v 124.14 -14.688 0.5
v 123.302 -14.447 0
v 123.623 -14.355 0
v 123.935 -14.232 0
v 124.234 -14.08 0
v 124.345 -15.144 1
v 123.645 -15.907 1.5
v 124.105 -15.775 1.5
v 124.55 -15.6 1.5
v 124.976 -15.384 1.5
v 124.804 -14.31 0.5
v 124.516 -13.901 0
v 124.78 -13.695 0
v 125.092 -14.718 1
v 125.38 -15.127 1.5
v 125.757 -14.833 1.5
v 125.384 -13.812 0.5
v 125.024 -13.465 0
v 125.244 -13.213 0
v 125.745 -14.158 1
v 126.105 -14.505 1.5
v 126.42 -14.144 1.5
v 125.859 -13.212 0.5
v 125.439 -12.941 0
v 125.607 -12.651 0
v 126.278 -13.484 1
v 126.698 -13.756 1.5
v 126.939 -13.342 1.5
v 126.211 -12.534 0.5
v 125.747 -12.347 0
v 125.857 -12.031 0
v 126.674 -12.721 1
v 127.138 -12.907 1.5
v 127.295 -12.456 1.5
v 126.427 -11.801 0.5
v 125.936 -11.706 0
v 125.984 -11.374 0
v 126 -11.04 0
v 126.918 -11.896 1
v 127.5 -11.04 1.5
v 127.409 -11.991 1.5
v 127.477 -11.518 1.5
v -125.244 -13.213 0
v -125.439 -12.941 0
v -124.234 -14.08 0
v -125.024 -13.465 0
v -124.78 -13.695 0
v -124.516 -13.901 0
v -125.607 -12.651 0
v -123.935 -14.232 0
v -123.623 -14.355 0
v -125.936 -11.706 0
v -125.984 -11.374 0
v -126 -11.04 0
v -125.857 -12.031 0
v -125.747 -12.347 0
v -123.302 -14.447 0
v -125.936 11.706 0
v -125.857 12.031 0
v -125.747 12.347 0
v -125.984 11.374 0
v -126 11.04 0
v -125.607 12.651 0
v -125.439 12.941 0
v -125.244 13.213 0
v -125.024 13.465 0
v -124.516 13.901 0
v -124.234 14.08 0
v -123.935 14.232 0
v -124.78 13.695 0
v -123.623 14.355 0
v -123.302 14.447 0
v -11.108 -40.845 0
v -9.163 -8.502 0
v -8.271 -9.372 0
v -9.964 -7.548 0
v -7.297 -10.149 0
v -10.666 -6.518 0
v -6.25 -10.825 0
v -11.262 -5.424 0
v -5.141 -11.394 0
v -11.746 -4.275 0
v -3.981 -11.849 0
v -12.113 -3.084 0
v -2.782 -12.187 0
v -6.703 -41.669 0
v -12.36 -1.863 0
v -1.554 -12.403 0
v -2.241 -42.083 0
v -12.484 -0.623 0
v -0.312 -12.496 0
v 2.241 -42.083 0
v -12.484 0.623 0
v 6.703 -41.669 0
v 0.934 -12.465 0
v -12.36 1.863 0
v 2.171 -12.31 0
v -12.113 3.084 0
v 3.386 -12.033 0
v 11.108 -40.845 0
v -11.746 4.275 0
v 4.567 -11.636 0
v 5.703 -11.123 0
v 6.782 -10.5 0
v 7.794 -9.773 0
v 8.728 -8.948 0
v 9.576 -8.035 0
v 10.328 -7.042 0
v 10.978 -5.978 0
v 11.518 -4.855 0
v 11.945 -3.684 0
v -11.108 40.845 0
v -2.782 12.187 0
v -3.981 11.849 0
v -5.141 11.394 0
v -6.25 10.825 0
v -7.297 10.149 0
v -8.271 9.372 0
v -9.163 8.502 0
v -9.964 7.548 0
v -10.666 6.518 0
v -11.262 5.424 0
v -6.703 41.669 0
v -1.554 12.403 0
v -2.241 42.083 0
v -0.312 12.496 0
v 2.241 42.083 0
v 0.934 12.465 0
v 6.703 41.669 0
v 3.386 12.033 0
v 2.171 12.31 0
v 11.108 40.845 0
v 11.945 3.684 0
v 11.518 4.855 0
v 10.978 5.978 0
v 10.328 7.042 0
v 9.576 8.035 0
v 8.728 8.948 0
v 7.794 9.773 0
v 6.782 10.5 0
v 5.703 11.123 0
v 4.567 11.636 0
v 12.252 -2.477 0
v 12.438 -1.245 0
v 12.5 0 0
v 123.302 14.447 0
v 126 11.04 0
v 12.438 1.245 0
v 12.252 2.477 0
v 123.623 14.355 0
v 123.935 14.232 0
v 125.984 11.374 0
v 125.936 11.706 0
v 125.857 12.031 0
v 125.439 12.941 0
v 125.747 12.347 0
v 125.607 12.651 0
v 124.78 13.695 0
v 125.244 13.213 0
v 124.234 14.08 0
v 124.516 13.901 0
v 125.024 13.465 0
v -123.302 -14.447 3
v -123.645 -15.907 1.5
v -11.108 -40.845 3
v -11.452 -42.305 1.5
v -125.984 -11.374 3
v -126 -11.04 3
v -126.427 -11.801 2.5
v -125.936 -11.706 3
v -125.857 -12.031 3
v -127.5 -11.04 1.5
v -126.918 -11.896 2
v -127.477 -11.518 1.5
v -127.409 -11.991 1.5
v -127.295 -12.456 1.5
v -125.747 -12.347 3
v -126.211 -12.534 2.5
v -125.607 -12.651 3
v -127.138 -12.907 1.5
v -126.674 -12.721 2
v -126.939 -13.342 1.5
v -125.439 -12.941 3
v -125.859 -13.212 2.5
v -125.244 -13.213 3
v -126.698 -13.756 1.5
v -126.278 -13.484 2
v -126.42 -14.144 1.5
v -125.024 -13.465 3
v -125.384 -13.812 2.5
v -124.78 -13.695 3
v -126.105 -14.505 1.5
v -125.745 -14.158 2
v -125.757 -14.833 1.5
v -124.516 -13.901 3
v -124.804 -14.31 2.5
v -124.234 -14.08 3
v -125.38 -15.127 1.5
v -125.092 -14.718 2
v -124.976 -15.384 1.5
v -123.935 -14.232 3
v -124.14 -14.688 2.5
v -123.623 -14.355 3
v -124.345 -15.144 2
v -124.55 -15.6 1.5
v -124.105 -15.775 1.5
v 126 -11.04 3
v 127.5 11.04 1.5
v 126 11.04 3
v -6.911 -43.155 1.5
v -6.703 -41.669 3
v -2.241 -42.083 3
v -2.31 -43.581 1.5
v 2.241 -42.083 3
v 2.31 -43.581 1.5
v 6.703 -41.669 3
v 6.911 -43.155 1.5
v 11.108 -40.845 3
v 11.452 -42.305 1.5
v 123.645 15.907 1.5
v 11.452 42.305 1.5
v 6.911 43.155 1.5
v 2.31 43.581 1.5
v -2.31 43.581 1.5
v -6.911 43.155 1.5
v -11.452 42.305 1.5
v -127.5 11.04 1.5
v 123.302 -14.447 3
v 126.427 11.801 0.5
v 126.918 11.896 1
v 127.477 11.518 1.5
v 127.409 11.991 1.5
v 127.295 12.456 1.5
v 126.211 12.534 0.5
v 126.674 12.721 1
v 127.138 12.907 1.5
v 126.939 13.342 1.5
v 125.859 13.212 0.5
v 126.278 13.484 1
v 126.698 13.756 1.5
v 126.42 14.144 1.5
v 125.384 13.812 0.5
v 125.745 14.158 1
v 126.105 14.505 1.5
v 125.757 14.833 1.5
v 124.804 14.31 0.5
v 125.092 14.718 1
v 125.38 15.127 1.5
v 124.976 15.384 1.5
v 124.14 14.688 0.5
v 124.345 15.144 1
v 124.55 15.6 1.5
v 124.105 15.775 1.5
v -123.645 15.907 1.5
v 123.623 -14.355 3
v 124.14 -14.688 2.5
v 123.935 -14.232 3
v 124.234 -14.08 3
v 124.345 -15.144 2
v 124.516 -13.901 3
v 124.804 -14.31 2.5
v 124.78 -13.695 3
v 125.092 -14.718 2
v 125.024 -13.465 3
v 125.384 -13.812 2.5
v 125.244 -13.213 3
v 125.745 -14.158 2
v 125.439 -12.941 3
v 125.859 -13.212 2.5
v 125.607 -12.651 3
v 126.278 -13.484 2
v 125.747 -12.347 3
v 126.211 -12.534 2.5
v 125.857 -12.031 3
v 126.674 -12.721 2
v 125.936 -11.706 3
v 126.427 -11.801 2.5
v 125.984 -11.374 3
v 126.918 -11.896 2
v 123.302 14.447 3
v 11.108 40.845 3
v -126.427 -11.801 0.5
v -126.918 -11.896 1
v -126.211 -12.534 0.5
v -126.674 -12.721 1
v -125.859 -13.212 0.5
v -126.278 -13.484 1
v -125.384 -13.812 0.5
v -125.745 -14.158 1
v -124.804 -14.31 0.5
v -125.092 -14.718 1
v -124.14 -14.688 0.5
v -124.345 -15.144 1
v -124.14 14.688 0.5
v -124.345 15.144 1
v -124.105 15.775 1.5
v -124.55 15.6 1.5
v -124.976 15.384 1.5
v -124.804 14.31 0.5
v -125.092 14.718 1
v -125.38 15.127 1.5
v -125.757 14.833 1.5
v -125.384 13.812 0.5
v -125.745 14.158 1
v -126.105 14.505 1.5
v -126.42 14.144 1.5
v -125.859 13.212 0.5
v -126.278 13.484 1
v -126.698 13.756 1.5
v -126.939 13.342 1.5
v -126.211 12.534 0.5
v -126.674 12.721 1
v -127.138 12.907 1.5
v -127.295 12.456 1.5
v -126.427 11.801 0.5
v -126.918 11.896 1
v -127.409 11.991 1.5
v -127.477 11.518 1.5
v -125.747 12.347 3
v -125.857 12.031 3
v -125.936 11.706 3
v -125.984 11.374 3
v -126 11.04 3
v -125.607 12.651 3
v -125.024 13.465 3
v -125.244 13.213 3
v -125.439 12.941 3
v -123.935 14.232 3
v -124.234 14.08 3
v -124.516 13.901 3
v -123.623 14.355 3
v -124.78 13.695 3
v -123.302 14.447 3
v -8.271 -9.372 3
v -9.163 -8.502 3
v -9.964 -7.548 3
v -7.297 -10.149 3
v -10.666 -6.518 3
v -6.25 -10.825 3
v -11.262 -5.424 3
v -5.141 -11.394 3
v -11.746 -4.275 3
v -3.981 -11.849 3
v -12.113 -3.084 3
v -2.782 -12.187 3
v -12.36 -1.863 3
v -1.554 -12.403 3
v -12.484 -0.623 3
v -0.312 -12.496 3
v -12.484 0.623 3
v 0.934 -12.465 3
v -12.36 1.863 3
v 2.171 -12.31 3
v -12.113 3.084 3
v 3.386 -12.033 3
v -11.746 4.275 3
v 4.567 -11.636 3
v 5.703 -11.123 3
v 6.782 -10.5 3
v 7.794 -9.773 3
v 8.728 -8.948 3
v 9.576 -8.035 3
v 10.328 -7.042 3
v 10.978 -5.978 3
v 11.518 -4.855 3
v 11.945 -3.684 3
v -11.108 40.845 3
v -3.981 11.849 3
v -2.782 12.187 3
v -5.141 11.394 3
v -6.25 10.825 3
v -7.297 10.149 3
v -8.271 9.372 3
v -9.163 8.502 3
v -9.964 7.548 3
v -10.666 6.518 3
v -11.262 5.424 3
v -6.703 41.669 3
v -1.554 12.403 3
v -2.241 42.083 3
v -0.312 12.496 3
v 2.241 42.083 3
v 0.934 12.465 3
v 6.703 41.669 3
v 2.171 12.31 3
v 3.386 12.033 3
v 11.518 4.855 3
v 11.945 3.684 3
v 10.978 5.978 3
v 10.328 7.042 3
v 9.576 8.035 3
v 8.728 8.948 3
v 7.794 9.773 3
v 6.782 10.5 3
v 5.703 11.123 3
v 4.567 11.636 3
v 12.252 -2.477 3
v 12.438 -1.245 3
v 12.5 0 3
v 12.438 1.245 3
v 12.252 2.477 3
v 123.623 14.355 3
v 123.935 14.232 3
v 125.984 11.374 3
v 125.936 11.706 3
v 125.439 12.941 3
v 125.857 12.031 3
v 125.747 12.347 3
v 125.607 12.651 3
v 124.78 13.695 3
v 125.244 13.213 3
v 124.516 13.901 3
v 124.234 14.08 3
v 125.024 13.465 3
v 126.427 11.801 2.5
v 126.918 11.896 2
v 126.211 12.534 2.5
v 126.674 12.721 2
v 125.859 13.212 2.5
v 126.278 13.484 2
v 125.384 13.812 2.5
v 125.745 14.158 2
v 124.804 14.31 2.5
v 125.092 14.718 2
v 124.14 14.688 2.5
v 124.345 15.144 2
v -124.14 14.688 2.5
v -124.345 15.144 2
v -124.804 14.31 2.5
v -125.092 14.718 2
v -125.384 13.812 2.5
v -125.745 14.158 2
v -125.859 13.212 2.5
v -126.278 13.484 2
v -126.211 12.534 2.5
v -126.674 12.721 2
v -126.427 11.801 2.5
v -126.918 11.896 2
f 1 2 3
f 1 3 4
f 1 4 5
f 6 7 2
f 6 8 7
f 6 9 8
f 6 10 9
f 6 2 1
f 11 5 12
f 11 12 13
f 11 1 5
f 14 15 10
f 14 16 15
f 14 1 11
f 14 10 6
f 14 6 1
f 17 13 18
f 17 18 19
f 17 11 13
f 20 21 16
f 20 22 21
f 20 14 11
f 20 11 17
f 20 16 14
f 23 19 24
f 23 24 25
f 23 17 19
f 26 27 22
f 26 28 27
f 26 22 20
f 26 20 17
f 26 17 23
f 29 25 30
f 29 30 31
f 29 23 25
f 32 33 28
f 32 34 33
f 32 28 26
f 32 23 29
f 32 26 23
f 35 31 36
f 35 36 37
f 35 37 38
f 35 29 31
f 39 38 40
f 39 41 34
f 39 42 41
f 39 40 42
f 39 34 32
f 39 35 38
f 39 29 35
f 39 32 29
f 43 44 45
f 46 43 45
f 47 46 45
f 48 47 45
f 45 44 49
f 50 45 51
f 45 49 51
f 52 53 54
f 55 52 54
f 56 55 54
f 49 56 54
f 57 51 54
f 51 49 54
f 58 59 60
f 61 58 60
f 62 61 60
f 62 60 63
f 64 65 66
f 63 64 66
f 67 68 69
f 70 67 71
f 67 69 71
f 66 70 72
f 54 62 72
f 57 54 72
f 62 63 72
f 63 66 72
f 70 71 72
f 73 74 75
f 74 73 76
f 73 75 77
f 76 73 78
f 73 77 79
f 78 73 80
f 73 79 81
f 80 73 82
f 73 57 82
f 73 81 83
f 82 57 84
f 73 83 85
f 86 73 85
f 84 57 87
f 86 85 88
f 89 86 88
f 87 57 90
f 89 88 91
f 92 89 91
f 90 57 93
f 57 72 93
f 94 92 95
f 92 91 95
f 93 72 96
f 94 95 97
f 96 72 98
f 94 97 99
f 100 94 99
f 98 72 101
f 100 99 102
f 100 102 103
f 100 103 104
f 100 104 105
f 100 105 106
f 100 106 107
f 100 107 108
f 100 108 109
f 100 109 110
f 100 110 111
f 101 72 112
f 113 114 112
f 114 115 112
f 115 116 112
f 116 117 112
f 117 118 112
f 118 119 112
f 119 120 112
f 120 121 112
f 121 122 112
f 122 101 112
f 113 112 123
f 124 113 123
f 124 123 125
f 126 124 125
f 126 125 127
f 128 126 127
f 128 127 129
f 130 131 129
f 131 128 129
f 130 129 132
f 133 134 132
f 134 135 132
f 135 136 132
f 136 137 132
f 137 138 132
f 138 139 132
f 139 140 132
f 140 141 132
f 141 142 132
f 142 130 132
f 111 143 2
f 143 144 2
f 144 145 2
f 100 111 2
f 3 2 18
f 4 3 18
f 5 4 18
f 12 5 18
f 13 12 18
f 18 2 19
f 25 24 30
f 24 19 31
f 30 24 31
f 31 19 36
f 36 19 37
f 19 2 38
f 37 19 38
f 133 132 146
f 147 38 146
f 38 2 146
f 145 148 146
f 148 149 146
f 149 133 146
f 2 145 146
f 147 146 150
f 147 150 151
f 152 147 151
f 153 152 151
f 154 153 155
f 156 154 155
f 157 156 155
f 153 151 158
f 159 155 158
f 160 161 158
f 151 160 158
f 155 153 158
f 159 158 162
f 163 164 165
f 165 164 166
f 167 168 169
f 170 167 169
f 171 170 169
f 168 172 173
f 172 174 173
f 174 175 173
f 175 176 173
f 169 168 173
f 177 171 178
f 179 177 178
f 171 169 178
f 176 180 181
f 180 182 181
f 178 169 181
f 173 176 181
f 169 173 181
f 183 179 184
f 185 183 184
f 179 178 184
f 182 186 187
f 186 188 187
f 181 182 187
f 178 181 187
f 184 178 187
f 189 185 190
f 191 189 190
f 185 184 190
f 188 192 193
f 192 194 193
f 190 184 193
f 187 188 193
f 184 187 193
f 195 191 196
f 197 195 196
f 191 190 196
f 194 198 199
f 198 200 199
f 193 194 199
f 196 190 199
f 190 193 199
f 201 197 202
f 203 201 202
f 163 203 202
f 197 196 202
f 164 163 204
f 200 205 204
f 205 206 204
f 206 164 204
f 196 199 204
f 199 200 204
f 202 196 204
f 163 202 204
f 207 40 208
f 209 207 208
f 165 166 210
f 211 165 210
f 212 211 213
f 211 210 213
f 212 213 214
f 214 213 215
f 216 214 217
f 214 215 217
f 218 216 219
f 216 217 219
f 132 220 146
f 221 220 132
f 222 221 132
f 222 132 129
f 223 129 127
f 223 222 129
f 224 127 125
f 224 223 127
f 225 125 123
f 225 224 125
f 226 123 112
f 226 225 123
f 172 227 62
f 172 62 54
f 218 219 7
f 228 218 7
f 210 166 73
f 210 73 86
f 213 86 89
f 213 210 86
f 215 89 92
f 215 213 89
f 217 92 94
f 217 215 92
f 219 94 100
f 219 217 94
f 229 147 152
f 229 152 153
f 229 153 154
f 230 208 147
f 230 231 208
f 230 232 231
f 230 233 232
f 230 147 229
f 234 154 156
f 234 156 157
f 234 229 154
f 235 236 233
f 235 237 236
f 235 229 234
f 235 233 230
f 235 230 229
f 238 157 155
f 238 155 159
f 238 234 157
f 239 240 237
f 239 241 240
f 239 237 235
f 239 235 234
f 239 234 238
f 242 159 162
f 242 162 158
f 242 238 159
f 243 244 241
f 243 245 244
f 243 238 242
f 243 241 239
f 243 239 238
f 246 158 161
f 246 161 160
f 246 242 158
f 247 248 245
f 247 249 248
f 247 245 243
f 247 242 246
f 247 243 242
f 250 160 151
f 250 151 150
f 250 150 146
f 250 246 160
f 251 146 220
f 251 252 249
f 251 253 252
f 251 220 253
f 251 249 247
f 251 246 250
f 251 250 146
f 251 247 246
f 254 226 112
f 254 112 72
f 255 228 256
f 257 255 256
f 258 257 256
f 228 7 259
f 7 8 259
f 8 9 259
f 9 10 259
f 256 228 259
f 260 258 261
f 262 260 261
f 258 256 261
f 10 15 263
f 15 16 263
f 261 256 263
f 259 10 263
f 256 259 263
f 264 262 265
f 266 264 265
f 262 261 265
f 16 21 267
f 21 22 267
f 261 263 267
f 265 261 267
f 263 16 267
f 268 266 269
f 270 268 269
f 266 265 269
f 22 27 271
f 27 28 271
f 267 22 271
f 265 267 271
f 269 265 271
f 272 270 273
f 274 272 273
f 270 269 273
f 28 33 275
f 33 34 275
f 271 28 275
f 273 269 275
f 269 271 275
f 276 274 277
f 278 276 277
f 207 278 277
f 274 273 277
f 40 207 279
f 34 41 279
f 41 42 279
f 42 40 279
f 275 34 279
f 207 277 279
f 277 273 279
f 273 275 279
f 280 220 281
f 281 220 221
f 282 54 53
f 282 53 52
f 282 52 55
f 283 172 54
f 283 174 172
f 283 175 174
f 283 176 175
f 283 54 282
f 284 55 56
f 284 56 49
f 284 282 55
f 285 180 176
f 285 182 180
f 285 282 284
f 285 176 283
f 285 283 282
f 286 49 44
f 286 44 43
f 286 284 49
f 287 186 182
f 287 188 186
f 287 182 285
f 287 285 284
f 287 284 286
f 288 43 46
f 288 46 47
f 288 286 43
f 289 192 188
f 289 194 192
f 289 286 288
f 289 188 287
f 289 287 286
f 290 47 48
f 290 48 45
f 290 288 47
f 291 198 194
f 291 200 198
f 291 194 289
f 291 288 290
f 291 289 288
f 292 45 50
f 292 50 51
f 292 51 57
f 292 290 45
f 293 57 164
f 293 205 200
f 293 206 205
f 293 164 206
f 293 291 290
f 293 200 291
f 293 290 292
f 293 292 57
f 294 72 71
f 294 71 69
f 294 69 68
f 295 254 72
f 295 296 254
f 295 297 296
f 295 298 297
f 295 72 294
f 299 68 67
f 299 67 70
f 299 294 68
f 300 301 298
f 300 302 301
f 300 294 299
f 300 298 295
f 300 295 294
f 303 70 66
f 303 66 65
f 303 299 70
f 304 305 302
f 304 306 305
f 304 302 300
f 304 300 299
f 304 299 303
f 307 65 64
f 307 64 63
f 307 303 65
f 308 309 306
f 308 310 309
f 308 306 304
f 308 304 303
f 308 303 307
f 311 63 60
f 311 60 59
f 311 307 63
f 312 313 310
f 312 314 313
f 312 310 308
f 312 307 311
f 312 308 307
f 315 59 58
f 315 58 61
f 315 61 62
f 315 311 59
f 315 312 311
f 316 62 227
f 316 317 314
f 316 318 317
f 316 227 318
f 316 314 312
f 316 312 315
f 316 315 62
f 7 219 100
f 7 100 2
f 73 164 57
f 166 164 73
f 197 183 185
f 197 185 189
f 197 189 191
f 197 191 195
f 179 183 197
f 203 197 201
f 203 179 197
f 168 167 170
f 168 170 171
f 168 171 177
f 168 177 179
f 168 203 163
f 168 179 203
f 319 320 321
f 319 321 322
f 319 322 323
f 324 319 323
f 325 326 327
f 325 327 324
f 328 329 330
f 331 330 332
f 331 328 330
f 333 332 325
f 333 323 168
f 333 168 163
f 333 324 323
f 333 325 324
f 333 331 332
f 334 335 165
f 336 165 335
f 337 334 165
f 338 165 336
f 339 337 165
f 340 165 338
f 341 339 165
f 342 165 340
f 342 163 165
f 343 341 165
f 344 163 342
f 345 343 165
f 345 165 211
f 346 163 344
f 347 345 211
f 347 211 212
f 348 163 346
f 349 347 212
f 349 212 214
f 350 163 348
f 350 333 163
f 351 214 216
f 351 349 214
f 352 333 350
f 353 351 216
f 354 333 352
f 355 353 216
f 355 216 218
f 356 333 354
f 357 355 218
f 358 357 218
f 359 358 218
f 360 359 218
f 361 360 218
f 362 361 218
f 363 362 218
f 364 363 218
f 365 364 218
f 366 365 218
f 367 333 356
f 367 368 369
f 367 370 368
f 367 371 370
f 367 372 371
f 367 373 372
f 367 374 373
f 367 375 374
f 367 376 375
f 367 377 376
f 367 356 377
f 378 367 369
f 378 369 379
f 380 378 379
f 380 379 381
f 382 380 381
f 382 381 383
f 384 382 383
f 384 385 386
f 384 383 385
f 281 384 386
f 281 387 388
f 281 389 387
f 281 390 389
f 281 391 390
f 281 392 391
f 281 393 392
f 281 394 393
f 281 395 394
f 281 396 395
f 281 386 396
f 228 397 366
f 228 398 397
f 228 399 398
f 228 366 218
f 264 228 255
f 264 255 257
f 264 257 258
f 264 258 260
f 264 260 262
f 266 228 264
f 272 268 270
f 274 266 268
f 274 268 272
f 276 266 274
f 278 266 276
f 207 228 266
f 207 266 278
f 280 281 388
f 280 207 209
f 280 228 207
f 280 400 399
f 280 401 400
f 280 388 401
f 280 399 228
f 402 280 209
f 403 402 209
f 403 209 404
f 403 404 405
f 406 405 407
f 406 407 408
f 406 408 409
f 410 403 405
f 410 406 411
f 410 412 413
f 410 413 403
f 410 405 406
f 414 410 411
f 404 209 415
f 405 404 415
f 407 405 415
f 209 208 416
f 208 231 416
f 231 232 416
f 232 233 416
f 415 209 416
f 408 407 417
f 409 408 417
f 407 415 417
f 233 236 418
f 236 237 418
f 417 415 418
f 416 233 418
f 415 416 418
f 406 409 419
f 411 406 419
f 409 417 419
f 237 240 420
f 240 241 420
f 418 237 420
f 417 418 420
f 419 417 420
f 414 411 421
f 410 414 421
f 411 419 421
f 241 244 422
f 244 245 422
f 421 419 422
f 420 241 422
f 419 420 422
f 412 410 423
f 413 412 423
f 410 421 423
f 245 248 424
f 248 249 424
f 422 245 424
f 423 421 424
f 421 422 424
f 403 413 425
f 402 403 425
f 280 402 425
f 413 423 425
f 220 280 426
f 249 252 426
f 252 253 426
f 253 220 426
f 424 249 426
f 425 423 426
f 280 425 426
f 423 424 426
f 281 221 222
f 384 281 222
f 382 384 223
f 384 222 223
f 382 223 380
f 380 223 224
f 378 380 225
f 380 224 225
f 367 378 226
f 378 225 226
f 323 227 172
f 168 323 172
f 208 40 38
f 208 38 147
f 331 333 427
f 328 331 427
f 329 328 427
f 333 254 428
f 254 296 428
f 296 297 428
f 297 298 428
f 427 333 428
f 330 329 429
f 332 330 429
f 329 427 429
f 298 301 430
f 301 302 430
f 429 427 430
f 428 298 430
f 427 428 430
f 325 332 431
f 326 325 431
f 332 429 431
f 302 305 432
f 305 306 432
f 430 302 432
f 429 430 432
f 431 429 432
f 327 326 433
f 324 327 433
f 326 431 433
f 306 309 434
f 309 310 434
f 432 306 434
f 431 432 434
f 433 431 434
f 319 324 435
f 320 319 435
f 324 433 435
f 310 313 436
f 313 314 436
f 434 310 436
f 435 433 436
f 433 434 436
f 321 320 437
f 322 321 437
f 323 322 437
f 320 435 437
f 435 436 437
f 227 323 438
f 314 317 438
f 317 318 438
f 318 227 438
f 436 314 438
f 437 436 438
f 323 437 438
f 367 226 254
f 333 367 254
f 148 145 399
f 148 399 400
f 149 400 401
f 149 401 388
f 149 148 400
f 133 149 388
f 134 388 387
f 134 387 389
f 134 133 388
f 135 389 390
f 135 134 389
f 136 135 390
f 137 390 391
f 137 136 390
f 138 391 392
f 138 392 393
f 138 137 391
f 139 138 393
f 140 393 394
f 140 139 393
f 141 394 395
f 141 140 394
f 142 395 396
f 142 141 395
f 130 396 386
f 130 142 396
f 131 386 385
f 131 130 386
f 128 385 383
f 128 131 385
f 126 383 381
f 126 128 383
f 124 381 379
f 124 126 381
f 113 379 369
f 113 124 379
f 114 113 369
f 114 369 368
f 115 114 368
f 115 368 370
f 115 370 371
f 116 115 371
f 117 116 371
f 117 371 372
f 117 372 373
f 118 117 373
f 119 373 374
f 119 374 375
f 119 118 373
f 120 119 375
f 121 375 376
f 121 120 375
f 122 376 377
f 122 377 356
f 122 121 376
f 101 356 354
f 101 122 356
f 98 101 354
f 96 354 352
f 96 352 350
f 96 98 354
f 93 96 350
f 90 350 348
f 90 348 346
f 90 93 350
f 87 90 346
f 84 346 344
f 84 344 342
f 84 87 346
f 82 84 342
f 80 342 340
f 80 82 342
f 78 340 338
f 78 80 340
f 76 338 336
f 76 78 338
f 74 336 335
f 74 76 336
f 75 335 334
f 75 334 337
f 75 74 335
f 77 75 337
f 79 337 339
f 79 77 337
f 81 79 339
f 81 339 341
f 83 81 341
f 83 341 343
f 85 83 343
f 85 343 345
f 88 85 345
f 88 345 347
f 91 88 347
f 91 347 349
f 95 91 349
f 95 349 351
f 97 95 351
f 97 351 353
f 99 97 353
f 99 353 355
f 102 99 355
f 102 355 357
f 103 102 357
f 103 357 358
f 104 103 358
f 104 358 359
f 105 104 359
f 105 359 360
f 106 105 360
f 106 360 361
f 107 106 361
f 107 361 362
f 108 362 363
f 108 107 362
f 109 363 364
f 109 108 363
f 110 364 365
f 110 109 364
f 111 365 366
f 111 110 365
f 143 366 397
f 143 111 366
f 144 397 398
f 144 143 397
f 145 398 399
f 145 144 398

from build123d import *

# Parameters (mm, degrees)
F0_R     = 12.5
F1_DEPTH = 3
F2_R     = 50
F3_R     = 5
F4_SIZE  = 1.49999


# Not quite as in the source:
# - a fillet or chamfer is up to 0.001 mm smaller than in the source, because OpenCascade refuses the exact size


with BuildPart() as f1:
    # F0 (on Top) → F1 (new body)
    with BuildSketch(Plane.XY):
        Polygon((127.5, 15), (0, 45), (-127.5, 15), (-127.5, -15), (0, -45), (127.5, -15), align=None)
        Circle(F0_R, mode=Mode.SUBTRACT)
    extrude(amount=F1_DEPTH)

    # F2
    f2_edges = [f1.edges().sort_by_distance(p)[0] for p in [
        (0, 45, 1.5),
        (0, -45, 1.5),
    ]]
    fillet(f2_edges, radius=F2_R)

    # F3
    f3_edges = [f1.edges().sort_by_distance(p)[0] for p in [
        (127.5, 15, 1.5),
        (127.5, -15, 1.5),
        (-127.5, 15, 1.5),
        (-127.5, -15, 1.5),
    ]]
    fillet(f3_edges, radius=F3_R)

    # F4 (size 1.5 in the source; OpenCascade refuses exactly that, so slightly less here)
    f4_edges = [f1.edges().sort_by_distance(p)[0] for p in [
        (-67.548582, 29.106216, 3),
        (-67.548582, 29.106216, 0),
    ]]
    chamfer(f4_edges, length=F4_SIZE)


solid = f1.part
